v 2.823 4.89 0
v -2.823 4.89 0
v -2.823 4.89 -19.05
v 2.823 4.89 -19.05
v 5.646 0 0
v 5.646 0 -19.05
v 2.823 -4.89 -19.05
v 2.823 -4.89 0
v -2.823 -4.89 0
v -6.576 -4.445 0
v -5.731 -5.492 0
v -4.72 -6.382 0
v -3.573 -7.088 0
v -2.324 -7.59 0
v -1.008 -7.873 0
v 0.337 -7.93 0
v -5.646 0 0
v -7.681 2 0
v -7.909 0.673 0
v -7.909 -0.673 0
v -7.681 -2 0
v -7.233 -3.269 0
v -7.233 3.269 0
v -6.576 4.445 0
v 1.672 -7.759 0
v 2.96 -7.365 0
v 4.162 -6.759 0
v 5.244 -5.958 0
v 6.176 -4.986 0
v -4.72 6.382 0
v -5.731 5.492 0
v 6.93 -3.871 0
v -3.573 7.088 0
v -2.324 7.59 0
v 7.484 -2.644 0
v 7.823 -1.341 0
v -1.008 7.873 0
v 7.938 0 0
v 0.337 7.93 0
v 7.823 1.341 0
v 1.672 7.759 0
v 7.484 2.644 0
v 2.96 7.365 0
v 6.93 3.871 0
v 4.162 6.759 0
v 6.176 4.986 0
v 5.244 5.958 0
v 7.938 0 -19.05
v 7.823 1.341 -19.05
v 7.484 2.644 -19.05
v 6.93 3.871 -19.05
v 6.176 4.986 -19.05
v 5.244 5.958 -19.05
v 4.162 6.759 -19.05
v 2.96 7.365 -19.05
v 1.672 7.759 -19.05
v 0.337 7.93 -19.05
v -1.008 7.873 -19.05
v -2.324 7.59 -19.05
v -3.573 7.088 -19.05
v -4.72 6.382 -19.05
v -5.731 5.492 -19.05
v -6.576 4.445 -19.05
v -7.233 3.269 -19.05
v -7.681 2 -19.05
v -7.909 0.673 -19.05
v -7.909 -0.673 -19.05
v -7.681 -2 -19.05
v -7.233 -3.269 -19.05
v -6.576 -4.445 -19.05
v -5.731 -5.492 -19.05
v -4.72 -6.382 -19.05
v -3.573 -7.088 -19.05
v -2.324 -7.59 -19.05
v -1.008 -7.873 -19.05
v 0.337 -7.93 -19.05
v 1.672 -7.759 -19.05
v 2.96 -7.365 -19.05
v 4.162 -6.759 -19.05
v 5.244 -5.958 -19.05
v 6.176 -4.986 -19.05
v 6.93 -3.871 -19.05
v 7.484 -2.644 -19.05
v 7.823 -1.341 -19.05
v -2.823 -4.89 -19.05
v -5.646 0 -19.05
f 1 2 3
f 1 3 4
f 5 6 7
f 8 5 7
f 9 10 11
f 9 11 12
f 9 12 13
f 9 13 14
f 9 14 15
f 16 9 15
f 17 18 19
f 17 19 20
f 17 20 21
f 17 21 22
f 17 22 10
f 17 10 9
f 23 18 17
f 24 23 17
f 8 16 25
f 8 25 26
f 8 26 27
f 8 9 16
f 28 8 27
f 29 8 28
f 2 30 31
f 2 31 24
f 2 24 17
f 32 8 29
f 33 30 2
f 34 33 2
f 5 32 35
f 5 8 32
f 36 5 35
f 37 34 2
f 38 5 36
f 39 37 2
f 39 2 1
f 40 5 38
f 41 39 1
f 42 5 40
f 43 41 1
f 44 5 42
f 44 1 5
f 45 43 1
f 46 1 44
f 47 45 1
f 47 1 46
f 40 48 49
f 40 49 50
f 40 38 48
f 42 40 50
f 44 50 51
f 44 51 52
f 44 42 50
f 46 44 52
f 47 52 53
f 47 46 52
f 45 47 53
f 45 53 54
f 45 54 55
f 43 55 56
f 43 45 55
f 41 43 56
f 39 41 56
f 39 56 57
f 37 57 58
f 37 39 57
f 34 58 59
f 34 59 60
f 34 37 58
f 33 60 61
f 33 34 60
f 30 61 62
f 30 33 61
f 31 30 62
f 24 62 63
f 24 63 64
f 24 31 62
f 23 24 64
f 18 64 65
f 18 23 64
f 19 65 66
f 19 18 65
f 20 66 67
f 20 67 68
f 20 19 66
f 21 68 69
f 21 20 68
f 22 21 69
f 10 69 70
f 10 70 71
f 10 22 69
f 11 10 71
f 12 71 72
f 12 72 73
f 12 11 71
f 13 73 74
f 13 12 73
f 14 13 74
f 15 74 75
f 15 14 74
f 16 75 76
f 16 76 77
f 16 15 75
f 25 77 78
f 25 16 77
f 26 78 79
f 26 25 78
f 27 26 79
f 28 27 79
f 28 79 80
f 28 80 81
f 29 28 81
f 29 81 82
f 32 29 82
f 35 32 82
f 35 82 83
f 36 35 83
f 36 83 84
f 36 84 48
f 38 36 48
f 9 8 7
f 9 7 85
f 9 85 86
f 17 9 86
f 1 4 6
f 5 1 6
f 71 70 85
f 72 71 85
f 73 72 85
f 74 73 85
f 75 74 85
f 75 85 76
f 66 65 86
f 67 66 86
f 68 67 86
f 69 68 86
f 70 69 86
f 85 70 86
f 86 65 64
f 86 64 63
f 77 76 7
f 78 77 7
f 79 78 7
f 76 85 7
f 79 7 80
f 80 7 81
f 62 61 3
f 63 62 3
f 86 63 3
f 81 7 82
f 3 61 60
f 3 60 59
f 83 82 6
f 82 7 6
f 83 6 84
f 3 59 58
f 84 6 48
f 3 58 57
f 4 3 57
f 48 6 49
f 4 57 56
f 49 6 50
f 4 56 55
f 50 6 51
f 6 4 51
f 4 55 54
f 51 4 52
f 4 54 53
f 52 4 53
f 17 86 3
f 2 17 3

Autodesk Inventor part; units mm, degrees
ref_plane "YZ Plane" through (0, 0, 0) normal (1, 0, 0) x (0, 1, 0)
ref_plane "XZ Plane" through (0, 0, 0) normal (0, 1, 0) x (-1, 0, 0)
ref_plane "XY Plane" through (0, 0, 0) normal (0, 0, 1) x (1, 0, 0)
sketch "Sketch1" plane through (0, 0, 0) normal (0, 0, 1) x (1, 0, 0)
  line L0 (2.7496, 4.7625) -> (5.4993, 0)
  line L1 (5.4993, 0) -> (2.7496, -4.7625)
  line L2 (2.7496, -4.7625) -> (-2.7496, -4.7625)
  line L3 (-2.7496, -4.7625) -> (-5.4993, 0)
  line L4 (-5.4993, 0) -> (-2.7496, 4.7625)
  line L5 (-2.7496, 4.7625) -> (2.7496, 4.7625)
  circle A0 centre (0, 0) radius 7.9375
  circle A1 centre (0, 0) radius 5.4993 construction
  dimension "d0" = 9.525
  dimension "d2" = 15.875
  dimension "d3" = 2.4382
extrude "Extrusion1" add sketch "Sketch1" against normal blind 19.05
thicken "Thicken Hex" operation add thickness 0.127 both sides no extend neighbours yes toward (-0.8660254, 0.5, 0) faces at (-4.5827, 1.5875, -6.35) (-3.6662, -3.175, -6.35) (0.9165, -4.7625, -6.35) (-0.9165, 4.7625, -6.35) (3.6662, 3.175, -6.35) (4.5827, -1.5875, -6.35)
equation "\"d0\" = hexSize"
equation "\"d2\" = exteriorDiameter"
equation "\"d4\" = length"
equation "\"d6\" = printSpacing"
equation "\"d7\" = printSpacing"
equation "\"hexSize\" = 9.525"
equation "\"exteriorDiameter\" = 15.875"
equation "\"length\" = 19.05"
equation "\"printSpacing\" = 0.127"
properties part number "3_8x5_8x3_4-hexBearing" material "PC/ABS Plastic"
